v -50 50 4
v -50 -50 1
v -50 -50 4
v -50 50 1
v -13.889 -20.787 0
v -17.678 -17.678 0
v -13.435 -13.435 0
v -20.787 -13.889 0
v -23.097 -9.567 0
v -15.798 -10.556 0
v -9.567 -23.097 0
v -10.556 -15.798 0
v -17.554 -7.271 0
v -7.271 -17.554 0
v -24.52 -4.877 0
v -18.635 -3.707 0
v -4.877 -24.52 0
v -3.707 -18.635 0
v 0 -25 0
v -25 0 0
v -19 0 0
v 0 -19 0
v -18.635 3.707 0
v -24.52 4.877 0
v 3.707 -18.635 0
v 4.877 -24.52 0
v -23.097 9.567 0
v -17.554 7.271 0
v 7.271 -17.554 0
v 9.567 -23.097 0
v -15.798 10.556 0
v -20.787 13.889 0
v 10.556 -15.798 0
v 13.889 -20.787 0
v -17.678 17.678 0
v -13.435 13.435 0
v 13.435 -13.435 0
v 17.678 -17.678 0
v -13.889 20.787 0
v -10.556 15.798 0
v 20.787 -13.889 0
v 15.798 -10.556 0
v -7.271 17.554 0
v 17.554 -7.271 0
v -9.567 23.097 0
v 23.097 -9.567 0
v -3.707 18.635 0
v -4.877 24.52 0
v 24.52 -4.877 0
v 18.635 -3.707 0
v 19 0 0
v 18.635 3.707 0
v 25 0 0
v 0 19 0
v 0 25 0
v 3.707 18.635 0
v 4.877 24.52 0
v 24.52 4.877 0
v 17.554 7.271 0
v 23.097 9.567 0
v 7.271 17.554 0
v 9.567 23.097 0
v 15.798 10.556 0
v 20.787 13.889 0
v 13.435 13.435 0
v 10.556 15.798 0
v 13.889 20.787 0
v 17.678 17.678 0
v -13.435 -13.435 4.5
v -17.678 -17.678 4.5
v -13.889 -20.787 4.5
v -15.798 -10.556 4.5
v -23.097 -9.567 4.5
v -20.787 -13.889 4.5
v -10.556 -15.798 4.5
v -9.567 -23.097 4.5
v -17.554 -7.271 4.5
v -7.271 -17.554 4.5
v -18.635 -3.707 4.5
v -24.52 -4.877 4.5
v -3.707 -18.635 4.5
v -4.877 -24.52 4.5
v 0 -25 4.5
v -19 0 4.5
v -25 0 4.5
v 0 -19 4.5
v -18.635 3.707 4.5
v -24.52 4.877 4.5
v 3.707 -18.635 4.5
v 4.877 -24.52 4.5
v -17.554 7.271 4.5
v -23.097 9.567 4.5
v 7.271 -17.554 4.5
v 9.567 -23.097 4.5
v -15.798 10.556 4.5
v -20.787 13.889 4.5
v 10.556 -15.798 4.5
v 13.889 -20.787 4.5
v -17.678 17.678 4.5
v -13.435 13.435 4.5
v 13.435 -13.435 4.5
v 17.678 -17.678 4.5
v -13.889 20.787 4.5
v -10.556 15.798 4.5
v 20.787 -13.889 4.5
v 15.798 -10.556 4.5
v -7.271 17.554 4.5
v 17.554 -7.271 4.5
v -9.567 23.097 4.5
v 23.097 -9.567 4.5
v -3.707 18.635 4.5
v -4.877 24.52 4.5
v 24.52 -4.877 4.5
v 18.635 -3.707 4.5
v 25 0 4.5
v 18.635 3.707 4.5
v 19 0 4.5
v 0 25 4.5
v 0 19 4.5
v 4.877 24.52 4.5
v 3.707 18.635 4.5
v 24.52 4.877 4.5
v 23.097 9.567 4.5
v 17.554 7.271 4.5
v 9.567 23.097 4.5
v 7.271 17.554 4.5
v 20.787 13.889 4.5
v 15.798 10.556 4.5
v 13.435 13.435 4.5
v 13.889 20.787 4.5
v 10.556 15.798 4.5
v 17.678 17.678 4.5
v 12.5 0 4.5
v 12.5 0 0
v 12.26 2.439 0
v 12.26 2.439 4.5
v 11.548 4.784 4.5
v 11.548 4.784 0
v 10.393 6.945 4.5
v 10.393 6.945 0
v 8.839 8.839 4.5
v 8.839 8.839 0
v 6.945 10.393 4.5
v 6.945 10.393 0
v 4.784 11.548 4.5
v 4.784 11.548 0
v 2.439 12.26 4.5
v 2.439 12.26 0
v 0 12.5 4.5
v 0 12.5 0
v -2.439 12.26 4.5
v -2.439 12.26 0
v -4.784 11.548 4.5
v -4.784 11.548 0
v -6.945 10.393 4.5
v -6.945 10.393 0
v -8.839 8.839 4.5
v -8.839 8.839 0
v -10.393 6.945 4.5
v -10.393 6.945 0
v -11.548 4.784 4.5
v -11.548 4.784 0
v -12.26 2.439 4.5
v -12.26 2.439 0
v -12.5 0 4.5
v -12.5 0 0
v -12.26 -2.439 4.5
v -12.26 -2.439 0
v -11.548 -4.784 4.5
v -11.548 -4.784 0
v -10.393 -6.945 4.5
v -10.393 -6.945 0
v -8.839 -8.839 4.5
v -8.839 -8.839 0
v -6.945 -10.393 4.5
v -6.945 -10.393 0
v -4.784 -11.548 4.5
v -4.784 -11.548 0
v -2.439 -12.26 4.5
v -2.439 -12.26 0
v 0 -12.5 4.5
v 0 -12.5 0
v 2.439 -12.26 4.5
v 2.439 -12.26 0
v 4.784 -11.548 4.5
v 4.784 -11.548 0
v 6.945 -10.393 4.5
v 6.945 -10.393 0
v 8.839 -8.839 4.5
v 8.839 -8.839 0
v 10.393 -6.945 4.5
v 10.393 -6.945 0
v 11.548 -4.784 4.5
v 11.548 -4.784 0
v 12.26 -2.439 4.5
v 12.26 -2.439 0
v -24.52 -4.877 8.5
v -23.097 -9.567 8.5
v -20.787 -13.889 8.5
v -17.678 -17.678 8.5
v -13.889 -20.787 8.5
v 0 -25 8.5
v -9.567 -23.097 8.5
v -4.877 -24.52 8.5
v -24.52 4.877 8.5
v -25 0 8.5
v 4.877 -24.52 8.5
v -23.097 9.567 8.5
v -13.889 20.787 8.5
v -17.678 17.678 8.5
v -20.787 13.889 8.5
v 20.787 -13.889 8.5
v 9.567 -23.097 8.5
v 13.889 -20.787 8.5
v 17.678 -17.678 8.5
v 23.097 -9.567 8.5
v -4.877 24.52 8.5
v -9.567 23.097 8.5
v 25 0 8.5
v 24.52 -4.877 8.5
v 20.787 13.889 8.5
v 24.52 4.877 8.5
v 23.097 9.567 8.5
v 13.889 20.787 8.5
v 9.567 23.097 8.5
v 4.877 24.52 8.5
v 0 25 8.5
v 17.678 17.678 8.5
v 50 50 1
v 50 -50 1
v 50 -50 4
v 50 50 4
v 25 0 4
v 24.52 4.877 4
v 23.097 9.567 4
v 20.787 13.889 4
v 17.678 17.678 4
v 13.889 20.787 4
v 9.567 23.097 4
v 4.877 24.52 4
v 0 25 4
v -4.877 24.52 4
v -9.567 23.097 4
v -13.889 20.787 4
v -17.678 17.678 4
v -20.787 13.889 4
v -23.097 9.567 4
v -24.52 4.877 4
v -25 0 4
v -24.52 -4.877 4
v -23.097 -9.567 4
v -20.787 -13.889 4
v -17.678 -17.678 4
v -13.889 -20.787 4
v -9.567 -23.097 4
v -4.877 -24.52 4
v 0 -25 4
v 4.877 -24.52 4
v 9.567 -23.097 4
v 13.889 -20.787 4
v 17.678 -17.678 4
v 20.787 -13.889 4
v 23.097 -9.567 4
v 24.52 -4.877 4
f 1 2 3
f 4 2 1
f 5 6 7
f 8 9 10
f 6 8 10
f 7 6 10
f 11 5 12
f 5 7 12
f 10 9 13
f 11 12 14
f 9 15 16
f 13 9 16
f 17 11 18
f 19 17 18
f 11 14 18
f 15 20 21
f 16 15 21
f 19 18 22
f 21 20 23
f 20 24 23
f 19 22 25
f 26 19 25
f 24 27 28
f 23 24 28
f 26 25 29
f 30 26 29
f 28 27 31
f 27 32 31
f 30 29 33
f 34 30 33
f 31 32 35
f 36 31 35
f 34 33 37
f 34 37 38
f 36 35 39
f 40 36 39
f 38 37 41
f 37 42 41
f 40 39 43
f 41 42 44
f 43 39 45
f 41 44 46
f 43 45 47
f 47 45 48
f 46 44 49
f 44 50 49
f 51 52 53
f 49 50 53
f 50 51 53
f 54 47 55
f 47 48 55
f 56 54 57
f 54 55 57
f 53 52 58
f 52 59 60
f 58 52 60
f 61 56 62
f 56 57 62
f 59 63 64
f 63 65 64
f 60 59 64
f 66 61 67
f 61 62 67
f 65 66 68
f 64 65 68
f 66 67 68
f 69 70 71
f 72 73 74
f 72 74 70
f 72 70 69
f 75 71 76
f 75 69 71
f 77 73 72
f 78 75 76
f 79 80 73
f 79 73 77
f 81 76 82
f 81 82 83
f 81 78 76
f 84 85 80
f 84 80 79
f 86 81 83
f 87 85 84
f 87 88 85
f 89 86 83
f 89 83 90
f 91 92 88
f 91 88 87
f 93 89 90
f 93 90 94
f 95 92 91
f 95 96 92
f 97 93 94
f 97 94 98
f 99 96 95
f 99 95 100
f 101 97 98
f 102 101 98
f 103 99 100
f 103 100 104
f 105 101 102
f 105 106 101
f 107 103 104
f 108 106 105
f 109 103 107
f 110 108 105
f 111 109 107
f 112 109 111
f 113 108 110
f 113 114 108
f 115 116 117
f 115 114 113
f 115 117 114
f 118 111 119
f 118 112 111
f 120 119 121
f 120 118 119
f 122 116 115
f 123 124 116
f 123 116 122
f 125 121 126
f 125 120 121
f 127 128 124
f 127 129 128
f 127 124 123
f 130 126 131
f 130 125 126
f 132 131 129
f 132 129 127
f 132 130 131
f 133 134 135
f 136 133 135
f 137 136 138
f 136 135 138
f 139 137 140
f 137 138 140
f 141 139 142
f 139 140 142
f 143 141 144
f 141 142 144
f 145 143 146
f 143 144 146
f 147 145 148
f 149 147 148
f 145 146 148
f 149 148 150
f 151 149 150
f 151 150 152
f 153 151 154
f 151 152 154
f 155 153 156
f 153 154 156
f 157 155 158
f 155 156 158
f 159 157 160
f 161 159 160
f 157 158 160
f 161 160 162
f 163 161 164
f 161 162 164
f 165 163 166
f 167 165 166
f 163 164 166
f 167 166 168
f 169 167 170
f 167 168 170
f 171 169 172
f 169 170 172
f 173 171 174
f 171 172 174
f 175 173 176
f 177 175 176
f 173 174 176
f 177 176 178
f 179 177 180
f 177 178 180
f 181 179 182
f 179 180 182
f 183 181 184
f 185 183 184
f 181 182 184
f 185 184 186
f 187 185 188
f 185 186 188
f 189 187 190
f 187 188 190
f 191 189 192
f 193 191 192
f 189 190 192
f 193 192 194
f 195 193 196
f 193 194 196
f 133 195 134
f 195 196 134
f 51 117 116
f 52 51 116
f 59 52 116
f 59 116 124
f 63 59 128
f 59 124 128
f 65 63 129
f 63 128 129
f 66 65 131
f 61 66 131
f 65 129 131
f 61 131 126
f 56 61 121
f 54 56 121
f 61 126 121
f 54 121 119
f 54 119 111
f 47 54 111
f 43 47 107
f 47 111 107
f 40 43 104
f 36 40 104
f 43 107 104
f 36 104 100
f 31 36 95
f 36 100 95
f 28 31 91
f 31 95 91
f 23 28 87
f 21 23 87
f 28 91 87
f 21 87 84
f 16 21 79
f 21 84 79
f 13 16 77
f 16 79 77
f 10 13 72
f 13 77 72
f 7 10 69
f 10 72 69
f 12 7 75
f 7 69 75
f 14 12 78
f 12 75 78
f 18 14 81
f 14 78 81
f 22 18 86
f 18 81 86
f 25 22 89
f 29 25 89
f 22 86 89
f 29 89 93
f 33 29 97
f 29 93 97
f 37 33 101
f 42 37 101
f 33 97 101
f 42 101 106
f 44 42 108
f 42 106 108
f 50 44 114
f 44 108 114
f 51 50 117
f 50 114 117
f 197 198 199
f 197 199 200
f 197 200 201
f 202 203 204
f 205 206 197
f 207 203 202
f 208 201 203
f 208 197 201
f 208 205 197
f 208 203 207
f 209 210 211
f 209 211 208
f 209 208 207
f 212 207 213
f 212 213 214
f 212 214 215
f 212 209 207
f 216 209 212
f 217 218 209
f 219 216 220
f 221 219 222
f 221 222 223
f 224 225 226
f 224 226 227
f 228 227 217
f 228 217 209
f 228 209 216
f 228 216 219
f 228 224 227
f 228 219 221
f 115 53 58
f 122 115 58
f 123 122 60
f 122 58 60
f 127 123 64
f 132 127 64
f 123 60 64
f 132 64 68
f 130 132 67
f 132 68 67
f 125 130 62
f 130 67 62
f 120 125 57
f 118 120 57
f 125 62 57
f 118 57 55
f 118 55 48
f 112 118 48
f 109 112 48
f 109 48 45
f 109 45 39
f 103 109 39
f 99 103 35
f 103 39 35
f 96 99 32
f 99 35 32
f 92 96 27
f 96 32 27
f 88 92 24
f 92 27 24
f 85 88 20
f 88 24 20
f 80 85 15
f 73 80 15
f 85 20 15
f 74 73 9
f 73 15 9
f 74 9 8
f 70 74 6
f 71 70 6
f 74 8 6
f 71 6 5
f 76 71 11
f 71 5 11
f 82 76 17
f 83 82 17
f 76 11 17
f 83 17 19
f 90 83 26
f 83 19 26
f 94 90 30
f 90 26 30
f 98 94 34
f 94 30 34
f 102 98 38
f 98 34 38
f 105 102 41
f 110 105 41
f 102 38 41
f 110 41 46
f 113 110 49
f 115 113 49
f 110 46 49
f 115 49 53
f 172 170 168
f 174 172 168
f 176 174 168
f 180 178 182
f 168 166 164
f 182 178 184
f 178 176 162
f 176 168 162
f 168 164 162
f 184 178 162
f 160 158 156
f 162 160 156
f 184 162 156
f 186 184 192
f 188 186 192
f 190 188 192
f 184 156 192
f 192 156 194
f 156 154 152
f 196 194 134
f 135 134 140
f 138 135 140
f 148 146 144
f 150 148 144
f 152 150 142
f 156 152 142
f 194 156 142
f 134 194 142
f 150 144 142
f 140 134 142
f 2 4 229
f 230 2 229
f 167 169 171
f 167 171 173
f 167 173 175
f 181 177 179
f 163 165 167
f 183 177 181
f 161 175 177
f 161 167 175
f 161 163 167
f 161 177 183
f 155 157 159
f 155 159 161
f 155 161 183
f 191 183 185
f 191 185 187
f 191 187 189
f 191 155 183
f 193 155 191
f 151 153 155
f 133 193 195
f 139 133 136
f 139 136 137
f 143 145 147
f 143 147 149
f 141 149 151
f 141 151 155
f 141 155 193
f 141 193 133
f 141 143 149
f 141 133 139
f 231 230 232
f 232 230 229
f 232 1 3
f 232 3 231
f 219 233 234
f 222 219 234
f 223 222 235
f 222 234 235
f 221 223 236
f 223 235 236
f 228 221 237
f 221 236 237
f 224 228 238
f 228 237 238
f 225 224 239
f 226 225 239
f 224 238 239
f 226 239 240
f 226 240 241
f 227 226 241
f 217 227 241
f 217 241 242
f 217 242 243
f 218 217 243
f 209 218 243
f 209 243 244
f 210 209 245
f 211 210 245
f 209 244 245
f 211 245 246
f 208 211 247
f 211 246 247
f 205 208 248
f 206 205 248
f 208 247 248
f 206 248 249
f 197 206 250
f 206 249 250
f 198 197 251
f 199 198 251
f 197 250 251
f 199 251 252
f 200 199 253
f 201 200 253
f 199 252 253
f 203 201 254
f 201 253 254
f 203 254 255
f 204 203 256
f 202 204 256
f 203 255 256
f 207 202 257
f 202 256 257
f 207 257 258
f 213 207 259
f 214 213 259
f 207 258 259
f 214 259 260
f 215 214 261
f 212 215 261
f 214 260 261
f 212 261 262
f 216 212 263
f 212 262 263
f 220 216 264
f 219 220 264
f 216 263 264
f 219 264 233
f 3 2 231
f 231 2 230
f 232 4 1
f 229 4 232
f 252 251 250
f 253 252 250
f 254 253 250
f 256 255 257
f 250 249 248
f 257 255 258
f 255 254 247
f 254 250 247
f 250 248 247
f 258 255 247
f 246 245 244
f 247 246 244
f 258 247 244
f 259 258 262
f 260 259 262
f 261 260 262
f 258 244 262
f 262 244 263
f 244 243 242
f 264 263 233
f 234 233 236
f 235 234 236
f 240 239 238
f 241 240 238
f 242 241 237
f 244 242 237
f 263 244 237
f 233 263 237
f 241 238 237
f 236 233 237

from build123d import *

# Parameters (mm, degrees)
F0_R     = 25
F1_DEPTH = 4.5
F2_R     = 19
F3_DEPTH = 4.5
F4_R     = 12.5
F5_DEPTH = 4.5
F7_START = 1
F6_W     = 100
F6_H     = 100
F7_DEPTH = 3
F9_START = 4
F8_R     = 25
F9_DEPTH = 4.5


with BuildPart() as f1:
    # F0 (on Top) → F1 (new body)
    with BuildSketch(Plane.XY):
        Circle(F0_R)
    extrude(amount=F1_DEPTH)

    # F2 (on face) → F3 (cut)
    with BuildSketch(Plane.XY.offset(4.5)):
        Circle(F2_R)
    extrude(amount=-F3_DEPTH, mode=Mode.SUBTRACT)


with BuildPart() as f5:
    # F4 (on Top) → F5 (new body)
    with BuildSketch(Plane.XY):
        Circle(F4_R)
    extrude(amount=F5_DEPTH)


with BuildPart() as f7:
    # F6 (on Top) → F7 (new body)
    with BuildSketch(Plane.XY.offset(F7_START)):
        Rectangle(F6_W, F6_H)
    extrude(amount=F7_DEPTH)


with BuildPart() as f9:
    # F8 (on Top) → F9 (new body)
    with BuildSketch(Plane.XY.offset(F9_START)):
        Circle(F8_R)
    extrude(amount=F9_DEPTH)


solid = Compound([f1.part, f5.part, f7.part, f9.part])
